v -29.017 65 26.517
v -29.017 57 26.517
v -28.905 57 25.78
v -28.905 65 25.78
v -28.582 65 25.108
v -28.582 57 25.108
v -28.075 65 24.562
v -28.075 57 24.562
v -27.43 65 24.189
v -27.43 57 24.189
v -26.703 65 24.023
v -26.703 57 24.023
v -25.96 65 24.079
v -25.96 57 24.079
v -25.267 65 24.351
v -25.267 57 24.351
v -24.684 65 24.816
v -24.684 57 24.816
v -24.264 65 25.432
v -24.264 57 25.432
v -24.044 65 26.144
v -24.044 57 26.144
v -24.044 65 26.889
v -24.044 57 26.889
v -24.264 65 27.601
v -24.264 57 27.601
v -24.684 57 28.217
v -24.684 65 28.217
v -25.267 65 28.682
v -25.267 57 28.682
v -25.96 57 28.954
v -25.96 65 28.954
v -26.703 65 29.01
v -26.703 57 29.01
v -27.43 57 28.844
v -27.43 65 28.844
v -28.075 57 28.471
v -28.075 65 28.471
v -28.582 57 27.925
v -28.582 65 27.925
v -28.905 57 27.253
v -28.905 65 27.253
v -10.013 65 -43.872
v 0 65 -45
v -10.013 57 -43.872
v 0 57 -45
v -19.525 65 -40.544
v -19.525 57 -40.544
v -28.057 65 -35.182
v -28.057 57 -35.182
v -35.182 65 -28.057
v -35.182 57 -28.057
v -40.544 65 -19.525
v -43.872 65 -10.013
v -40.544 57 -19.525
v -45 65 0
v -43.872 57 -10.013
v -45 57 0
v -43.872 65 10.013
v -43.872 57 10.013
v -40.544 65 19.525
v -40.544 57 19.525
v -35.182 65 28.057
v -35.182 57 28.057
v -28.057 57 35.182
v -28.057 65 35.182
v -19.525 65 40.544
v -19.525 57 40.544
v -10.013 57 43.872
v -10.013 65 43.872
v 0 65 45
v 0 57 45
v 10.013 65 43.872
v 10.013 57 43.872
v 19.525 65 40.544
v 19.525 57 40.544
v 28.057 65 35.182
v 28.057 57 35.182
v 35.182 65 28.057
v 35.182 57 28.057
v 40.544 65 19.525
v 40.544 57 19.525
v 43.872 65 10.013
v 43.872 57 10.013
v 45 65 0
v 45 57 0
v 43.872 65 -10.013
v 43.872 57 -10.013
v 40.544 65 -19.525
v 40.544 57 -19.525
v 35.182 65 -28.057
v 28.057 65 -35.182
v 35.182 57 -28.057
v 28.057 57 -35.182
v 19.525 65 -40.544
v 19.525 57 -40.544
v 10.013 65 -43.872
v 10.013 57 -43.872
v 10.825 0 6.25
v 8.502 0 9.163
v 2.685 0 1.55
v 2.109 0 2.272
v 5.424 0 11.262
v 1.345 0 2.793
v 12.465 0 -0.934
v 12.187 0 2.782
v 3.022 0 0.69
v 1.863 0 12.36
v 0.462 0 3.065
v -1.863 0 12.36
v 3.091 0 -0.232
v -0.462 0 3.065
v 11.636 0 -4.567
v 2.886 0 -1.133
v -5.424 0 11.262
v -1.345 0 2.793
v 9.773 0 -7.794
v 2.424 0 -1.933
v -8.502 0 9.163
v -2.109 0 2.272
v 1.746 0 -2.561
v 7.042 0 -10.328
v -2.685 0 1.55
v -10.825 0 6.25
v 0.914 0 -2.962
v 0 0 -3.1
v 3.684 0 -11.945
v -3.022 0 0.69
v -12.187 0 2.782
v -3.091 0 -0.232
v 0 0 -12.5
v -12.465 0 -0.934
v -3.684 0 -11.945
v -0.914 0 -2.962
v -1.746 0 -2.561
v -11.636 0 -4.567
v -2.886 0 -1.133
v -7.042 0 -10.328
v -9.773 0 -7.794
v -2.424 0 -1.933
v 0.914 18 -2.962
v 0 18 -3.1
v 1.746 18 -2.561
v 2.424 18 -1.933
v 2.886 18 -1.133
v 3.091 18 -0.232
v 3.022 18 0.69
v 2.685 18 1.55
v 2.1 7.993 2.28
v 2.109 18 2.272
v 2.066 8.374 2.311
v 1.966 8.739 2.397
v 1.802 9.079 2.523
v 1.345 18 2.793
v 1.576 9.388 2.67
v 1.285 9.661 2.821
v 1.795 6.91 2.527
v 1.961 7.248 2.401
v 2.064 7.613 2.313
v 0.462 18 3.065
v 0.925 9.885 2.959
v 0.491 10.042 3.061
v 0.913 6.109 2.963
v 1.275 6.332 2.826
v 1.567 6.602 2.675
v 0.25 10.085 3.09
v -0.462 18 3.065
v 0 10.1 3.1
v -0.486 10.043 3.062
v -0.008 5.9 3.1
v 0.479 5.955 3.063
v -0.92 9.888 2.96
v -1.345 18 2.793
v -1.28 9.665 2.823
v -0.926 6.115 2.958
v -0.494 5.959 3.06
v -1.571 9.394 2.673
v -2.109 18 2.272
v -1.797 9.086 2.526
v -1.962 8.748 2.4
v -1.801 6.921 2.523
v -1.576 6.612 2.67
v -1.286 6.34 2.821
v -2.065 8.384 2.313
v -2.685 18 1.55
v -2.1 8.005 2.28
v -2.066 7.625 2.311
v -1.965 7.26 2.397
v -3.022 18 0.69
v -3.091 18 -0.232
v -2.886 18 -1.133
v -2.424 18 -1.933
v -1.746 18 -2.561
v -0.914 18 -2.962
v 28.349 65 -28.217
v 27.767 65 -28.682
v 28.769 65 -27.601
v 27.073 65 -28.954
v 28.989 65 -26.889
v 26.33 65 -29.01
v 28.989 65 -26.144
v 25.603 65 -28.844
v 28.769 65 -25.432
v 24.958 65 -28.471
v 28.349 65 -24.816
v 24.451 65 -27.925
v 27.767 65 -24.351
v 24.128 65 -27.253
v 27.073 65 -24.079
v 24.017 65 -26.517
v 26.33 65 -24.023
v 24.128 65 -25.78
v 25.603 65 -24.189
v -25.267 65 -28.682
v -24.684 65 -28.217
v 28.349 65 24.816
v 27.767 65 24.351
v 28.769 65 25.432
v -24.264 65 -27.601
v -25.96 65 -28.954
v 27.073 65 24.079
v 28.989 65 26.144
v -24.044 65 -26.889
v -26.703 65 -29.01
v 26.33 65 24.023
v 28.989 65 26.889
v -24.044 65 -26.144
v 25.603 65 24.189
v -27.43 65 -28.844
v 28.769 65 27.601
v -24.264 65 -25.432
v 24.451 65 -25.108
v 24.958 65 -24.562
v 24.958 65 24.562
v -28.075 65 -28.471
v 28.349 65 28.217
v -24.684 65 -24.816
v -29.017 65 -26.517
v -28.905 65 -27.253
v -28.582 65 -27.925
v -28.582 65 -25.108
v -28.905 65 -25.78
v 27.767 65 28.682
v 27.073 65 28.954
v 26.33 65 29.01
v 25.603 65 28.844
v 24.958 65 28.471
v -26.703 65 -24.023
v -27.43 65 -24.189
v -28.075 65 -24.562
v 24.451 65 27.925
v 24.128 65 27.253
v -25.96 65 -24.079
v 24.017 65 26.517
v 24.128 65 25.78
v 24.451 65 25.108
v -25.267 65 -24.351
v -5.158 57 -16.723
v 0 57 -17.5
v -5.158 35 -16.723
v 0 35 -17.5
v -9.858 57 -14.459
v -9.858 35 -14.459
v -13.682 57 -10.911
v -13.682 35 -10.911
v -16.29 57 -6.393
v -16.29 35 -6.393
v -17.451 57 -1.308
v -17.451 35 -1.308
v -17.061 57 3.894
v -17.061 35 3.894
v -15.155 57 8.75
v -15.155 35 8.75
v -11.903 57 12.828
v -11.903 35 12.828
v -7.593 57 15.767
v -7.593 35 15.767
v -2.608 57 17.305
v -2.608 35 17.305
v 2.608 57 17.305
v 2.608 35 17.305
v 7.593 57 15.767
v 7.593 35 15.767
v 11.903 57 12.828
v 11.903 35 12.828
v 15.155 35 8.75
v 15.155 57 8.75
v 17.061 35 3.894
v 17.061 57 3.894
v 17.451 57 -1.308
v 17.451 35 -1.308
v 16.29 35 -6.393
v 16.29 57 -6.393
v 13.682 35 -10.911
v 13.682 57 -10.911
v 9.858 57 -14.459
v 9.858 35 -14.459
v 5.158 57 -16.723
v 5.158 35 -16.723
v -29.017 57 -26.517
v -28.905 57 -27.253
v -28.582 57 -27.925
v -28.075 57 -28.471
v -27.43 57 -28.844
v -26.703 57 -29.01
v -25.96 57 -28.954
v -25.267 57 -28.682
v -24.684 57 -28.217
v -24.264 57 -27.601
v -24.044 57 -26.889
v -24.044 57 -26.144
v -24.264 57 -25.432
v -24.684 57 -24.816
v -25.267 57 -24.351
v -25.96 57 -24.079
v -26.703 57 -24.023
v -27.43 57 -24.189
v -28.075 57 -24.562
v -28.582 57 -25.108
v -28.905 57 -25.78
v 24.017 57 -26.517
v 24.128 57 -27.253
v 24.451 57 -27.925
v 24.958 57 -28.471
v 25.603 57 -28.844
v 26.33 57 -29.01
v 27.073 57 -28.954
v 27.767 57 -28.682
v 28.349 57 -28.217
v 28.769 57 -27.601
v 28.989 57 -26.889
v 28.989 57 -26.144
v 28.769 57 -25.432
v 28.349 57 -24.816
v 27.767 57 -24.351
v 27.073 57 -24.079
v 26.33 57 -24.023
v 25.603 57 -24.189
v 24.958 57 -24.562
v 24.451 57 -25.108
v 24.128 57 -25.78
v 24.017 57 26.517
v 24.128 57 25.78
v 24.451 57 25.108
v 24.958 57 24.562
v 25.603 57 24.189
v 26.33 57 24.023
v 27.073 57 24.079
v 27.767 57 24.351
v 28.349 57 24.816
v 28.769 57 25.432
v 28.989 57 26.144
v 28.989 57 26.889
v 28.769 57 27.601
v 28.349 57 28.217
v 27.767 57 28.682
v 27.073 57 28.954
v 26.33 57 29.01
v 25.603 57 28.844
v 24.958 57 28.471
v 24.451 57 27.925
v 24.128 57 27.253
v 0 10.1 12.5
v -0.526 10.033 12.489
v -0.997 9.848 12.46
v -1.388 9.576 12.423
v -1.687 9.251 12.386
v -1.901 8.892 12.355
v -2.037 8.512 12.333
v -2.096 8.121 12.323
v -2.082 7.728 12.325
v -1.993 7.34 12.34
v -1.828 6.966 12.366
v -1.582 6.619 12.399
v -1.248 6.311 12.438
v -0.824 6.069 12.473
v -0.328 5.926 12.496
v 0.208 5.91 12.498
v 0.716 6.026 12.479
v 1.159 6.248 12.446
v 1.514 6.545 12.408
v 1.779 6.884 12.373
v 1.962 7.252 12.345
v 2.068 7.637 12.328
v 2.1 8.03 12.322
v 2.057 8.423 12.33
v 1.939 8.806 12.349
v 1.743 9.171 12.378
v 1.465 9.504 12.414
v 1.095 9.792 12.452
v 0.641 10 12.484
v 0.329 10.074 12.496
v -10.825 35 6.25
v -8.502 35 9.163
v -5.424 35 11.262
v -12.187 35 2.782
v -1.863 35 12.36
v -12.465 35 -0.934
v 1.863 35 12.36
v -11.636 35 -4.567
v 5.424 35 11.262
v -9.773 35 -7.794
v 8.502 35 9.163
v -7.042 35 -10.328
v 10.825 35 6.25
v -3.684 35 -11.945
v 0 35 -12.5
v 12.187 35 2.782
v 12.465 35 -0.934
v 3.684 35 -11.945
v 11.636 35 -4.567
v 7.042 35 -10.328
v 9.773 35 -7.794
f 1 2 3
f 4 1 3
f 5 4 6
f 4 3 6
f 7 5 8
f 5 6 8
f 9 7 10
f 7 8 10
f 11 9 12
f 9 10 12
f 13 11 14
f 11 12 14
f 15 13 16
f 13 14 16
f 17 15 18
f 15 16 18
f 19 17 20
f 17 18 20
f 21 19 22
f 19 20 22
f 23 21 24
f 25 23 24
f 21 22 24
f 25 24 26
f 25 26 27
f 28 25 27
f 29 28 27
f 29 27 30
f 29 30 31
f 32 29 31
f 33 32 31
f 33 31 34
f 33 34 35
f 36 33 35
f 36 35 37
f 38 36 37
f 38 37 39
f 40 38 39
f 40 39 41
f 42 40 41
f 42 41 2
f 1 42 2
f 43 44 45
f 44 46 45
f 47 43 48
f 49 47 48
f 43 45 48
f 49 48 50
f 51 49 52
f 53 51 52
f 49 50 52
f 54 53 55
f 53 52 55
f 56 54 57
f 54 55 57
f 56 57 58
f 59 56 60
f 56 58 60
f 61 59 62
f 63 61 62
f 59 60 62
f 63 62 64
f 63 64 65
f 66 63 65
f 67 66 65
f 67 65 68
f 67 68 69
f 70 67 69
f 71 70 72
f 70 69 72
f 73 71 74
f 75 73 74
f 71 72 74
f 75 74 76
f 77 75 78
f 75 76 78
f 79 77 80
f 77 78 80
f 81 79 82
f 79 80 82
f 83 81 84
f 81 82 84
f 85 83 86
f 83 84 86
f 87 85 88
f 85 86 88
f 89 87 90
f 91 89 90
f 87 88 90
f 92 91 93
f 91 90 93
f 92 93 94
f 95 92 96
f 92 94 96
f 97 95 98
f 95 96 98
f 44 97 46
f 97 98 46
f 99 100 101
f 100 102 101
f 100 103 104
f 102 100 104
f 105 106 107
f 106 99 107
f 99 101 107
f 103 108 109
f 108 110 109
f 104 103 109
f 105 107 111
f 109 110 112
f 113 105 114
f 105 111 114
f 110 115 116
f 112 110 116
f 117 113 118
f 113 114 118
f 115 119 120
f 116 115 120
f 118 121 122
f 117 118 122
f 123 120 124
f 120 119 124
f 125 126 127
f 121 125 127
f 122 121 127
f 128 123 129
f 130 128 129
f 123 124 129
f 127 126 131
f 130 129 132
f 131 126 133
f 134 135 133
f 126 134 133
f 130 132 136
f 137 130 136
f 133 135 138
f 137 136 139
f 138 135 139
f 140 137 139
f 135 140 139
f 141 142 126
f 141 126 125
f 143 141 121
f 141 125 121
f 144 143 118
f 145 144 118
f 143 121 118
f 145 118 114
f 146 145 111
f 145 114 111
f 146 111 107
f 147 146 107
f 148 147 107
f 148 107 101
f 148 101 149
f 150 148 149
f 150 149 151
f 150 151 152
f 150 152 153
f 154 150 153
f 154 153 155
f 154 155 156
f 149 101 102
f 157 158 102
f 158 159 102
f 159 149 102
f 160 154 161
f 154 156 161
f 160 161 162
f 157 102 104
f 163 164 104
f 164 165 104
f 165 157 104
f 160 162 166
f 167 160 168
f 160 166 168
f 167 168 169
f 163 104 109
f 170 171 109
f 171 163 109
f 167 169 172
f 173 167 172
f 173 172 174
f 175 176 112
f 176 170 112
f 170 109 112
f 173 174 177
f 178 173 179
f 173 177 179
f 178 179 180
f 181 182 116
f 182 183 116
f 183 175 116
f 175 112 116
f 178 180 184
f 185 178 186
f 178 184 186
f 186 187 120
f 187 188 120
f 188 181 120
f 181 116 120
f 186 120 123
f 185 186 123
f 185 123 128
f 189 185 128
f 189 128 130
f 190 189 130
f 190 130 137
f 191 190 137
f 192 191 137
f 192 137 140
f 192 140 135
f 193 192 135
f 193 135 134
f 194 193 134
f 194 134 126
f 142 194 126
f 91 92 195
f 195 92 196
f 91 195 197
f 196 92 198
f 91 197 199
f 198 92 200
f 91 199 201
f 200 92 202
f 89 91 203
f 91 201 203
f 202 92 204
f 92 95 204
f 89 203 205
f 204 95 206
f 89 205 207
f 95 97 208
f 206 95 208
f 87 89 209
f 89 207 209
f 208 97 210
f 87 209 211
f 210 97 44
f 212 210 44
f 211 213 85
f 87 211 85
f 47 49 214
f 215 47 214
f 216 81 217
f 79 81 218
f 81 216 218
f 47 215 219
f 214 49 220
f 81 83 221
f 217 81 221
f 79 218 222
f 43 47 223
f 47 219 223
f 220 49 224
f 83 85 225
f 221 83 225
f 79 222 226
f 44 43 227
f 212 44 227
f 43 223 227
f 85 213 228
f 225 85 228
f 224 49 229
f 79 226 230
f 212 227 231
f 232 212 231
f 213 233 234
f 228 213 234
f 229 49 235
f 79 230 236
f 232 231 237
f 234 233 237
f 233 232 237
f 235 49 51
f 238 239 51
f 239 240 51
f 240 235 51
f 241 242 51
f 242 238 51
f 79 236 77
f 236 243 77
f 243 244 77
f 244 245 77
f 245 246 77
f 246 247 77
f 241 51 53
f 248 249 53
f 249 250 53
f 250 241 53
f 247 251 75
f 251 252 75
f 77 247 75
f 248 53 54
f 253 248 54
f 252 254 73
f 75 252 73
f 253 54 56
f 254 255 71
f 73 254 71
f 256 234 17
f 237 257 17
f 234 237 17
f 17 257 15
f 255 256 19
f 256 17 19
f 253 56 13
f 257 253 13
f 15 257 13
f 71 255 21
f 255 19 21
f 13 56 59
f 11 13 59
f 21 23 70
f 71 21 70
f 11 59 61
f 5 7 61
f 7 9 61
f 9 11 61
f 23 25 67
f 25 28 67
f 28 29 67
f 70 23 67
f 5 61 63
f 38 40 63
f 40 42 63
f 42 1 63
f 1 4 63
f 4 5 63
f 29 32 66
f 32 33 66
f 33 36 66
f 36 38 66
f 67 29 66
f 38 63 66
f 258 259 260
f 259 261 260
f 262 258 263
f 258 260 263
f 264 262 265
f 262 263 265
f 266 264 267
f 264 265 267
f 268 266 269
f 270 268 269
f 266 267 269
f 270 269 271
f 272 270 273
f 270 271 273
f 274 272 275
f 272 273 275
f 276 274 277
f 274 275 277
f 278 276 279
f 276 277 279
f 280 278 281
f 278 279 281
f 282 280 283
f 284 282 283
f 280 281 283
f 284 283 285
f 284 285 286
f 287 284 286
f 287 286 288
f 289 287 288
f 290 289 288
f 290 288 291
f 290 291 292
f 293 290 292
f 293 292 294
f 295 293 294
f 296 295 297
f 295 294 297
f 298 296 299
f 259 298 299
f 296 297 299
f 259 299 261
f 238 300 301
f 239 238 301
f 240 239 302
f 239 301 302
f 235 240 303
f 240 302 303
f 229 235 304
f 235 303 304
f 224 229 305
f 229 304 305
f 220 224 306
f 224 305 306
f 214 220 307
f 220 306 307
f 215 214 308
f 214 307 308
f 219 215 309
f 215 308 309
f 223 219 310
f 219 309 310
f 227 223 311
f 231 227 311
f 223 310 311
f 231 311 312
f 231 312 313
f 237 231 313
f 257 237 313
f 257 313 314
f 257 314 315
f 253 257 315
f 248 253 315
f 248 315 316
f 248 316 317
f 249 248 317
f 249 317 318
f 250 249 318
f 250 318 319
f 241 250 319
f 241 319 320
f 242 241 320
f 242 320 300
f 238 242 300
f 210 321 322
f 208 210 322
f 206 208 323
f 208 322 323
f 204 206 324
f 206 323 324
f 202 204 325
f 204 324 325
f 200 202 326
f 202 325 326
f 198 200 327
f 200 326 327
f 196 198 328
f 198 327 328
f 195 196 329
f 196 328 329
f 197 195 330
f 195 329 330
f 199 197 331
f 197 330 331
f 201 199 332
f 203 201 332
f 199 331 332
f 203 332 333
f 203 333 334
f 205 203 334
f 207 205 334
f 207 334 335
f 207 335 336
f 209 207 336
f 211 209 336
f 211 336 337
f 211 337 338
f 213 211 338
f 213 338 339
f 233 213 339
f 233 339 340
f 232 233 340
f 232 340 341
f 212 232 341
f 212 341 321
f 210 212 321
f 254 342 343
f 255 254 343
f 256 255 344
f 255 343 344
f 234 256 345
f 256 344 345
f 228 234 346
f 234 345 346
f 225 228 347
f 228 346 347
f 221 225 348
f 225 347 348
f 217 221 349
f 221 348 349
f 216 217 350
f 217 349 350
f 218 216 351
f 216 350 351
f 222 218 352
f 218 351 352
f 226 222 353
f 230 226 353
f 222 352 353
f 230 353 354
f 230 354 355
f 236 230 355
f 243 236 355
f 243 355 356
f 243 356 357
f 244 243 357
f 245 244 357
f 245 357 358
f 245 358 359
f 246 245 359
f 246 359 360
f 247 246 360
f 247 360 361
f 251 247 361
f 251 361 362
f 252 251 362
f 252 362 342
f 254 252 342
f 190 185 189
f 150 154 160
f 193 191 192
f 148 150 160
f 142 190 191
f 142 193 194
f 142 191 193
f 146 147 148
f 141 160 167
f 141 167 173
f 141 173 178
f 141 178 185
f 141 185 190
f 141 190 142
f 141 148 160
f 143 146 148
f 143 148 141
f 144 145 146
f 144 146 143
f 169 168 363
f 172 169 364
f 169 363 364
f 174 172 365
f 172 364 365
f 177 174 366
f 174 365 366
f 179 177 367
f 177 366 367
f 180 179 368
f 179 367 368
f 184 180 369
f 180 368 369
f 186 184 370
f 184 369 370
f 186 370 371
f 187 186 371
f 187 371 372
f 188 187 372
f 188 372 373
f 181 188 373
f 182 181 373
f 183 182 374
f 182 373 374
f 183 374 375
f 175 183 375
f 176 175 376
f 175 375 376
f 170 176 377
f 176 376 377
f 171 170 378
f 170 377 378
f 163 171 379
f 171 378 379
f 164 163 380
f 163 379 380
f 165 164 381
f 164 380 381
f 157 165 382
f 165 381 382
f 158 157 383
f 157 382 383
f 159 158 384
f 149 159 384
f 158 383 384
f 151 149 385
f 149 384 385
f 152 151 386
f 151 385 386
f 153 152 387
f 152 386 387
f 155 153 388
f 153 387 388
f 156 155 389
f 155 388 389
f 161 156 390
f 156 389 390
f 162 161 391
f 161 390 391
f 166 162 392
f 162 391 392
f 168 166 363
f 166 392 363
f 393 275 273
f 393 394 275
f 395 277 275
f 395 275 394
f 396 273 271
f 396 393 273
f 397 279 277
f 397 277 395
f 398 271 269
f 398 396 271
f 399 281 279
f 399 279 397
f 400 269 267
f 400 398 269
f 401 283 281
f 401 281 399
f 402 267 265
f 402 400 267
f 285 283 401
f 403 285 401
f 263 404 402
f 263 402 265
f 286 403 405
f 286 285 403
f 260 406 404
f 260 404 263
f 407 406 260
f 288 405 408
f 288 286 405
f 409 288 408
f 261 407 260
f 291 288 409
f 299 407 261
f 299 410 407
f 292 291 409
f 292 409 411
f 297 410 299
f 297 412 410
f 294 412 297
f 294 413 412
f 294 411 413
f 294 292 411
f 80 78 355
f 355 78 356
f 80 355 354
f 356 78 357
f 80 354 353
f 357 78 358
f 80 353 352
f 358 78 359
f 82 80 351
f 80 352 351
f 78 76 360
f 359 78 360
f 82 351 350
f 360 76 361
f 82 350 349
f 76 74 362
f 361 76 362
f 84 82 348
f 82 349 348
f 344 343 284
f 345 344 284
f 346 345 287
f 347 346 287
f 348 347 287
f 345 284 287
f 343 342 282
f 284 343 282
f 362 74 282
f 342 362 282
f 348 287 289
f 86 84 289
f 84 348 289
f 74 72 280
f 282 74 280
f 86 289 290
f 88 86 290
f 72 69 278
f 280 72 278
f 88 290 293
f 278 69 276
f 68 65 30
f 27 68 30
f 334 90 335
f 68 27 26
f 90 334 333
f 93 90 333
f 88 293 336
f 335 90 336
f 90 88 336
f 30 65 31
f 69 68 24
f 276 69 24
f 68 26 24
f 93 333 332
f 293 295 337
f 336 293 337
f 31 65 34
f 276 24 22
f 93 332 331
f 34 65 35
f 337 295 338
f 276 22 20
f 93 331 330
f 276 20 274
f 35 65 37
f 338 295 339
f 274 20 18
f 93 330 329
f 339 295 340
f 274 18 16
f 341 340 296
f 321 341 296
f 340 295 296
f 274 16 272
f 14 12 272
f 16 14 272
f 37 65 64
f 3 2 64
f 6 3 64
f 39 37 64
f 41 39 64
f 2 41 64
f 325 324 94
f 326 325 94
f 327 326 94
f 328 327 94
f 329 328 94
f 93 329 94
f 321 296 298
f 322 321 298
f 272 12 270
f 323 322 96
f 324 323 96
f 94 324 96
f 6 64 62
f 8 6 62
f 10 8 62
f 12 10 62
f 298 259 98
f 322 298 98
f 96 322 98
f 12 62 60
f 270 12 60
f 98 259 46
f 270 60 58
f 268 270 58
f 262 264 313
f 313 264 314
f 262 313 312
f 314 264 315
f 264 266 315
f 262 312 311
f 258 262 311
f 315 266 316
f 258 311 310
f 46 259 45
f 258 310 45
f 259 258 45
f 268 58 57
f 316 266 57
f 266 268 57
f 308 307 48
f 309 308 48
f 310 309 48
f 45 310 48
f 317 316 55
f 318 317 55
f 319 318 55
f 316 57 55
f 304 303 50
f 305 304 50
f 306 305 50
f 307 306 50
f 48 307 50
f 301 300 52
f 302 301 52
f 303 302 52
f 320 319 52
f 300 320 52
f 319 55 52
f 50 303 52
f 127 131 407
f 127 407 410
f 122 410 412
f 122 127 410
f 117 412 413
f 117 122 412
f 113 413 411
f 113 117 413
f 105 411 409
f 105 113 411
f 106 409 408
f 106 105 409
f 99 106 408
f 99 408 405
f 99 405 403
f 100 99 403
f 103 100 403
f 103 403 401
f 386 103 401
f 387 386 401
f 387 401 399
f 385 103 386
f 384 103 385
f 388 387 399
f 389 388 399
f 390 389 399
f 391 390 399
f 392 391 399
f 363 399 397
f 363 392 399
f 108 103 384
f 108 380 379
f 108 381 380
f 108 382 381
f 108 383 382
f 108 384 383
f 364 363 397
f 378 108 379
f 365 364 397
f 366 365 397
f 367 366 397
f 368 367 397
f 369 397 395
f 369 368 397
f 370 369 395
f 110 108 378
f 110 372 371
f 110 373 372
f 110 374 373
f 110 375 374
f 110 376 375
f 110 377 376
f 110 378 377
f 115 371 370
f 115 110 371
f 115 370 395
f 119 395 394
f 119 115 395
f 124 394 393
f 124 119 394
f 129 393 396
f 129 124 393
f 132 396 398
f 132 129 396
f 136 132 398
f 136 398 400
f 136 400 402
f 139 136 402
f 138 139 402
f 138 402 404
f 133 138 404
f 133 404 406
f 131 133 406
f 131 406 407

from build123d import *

# Parameters (mm, degrees)
BROCA_DE_ROSQUEAR_PARA_TARRAXA_DE_M62_D = 5
ESBO_O4_R                               = 3.1
CORTE_EXTRUS_O1_DEPTH                   = 18
ESBO_O7_W                               = 2.1
ESBO_O7_H                               = 45
ESBO_O8_R                               = 17.5
ESBO_O8_R_2                             = 12.5
CORTE_EXTRUS_O2_DEPTH                   = 35


with BuildPart() as part:
    # Esboço1 → Revolução1 (revolve)
    with BuildSketch(Plane.XY, mode=Mode.PRIVATE) as revolu_o1_sk:
        Polygon((0, 0), (0, 65), (45, 65), (45, 57), (17.5, 57), (17.5, 0), align=None)
    revolve(revolu_o1_sk.sketch.rotate(Axis((0, 0, 0), (0, 1, 0)), 90), axis=Axis((0, 0, 0), (0, 1, 0)))

    # Broca de rosquear para tarraxa de M62 (through all)
    with Locations(Plane(origin=(0, 65, 0), x_dir=(1, 0, 0), z_dir=(0, 1, 0))):
        with Locations((26.516504294, 26.516504294), (-26.516504294, -26.516504294), (-26.516504294, 26.516504294), (26.516504294, -26.516504294)):
            Hole(BROCA_DE_ROSQUEAR_PARA_TARRAXA_DE_M62_D / 2)

    # Esboço4 → Corte-extrusão1 (cut)
    with BuildSketch(Plane.XZ):
        with Locations(Location((0, 0, 0), (0, 0, 270))):
            Circle(ESBO_O4_R)
    extrude(amount=-CORTE_EXTRUS_O1_DEPTH, mode=Mode.SUBTRACT)

    # Esboço7 → Broca de rosquear para tarraxa de M52 (revolve, cut)
    with BuildSketch(Plane(origin=(0, 8, 0), x_dir=(0, 1, 0), z_dir=(1, 0, 0))):
        with Locations((1.05, 22.5)):
            Rectangle(ESBO_O7_W, ESBO_O7_H)
    revolve(axis=Axis((0, 8, -6.35), (0, 0, 1)), mode=Mode.SUBTRACT)

    # Esboço8 → Corte-extrusão2 (cut)
    with BuildSketch(Plane.XZ):
        with Locations(Location((0, 0, 0), (0, 0, 270))):
            Circle(ESBO_O8_R)
        with Locations(Location((0, 0, 0), (0, 0, 270))):
            Circle(ESBO_O8_R_2, mode=Mode.SUBTRACT)
    extrude(amount=-CORTE_EXTRUS_O2_DEPTH, mode=Mode.SUBTRACT)


solid = part.part
